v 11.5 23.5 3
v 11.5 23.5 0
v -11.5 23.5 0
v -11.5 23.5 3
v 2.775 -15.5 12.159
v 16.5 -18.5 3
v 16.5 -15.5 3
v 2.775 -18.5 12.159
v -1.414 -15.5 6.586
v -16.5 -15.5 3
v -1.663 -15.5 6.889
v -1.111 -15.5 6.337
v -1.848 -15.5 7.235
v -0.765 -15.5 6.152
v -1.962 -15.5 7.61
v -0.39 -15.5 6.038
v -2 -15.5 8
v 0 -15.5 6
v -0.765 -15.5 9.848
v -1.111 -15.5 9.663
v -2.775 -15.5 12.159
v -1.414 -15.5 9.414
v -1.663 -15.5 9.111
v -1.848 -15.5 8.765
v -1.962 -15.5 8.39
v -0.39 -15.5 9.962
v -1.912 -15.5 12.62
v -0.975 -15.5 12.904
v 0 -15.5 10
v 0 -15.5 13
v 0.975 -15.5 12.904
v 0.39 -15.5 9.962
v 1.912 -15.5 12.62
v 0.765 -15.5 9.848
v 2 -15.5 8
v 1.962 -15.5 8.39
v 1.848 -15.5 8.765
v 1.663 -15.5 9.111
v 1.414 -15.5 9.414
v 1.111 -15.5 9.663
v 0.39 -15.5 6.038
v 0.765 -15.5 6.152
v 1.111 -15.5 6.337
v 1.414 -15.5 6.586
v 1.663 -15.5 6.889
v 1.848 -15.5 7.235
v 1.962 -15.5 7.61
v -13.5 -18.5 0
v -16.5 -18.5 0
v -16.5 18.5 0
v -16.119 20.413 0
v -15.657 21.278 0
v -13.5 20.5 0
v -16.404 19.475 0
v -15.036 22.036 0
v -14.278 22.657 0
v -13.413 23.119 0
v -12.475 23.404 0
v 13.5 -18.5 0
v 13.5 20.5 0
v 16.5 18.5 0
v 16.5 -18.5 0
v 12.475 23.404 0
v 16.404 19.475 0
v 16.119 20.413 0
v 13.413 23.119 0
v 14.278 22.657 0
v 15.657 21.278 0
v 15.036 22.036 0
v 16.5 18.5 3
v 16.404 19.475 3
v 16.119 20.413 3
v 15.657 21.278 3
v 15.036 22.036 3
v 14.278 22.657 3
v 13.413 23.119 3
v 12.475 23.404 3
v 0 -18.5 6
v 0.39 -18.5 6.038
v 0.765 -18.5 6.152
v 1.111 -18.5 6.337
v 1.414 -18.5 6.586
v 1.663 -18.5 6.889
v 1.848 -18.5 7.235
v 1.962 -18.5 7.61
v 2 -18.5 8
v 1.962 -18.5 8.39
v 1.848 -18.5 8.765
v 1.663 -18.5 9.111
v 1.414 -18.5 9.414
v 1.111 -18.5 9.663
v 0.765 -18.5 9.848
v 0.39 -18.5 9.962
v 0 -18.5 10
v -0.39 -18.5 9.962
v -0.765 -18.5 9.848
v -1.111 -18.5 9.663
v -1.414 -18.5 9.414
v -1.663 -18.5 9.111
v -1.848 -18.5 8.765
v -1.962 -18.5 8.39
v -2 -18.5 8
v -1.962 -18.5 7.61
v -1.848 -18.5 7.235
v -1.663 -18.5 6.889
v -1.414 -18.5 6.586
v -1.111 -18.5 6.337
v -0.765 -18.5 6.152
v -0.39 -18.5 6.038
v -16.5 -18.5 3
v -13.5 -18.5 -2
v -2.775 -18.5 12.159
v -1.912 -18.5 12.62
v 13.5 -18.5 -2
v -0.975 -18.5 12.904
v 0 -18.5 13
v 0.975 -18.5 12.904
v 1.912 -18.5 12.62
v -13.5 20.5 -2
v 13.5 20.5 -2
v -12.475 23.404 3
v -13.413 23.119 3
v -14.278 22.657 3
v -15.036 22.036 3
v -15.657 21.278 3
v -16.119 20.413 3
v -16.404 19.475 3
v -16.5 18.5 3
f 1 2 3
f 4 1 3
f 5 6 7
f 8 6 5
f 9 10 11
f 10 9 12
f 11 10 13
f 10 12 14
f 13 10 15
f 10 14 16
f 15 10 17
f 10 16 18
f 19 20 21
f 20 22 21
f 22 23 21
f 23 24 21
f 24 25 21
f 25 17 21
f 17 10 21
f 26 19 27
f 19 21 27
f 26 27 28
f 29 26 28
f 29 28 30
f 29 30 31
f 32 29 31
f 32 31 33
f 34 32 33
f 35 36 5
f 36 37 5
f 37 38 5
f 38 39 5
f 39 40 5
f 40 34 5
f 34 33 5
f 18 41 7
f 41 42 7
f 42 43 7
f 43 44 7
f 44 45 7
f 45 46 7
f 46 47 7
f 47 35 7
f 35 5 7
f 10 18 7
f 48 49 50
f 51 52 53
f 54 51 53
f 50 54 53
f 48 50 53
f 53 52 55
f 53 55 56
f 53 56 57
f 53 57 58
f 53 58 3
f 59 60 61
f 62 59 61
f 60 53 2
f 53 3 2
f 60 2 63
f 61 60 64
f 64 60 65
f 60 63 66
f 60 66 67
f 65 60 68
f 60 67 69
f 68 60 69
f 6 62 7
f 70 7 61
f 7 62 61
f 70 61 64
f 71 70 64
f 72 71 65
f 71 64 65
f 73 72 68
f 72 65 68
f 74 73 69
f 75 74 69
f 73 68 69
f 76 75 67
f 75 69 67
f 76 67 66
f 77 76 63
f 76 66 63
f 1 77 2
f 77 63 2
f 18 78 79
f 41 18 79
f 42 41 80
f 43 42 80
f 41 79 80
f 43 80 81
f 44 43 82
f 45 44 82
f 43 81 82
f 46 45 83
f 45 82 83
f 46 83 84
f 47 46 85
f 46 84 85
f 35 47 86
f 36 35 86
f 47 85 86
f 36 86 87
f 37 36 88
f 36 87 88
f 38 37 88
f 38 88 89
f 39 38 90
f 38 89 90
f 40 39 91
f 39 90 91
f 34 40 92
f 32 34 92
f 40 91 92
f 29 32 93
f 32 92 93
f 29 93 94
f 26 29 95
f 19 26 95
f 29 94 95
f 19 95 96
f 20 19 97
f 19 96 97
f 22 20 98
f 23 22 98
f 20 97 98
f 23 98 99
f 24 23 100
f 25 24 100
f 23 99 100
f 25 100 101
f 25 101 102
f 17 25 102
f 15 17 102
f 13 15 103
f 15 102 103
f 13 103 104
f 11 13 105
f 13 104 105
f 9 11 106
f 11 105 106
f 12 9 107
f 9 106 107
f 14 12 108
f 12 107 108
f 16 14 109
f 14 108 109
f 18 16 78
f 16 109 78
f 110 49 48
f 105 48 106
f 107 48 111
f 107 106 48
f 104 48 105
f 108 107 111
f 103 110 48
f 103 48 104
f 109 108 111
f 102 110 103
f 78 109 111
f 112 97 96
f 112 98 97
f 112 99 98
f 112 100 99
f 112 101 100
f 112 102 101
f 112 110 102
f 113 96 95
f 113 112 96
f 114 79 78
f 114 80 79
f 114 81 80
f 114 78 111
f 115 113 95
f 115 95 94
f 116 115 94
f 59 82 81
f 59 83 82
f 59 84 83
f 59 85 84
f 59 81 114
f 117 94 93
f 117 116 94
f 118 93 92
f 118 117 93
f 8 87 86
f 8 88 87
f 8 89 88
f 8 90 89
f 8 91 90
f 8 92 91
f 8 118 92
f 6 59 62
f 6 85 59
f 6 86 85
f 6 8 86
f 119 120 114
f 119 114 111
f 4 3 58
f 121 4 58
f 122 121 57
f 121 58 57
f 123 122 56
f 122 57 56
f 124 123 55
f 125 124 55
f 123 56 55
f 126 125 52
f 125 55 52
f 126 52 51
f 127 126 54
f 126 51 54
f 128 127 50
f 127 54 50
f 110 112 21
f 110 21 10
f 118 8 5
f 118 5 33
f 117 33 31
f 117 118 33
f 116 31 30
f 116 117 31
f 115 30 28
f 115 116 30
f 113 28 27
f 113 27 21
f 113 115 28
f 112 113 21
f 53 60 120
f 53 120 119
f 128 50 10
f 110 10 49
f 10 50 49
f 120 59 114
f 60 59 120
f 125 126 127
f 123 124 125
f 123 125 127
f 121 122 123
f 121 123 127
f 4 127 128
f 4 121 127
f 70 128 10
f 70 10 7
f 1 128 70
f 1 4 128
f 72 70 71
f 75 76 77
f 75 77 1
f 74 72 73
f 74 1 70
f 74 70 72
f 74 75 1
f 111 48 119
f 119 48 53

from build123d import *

# Parameters (mm, degrees)
EXTRUDE_1_DEPTH = 3
SKETCH_2_R      = 2
EXTRUDE_2_DEPTH = 3
SKETCH_3_W      = 27
SKETCH_3_H      = 39
EXTRUDE_3_DEPTH = 2


with BuildPart() as part:
    # 草图1 → 凸台-拉伸1 (new body)
    with BuildSketch(Plane.XY):
        with BuildLine():
            Line((11.5, 23.5), (-11.5, 23.5))
            ThreePointArc((-11.5, 23.5), (-15.035533906, 22.035533906), (-16.5, 18.5))
            Line((-16.5, 18.5), (-16.5, -18.5))
            Line((-16.5, -18.5), (16.5, -18.5))
            Line((16.5, -18.5), (16.5, 18.5))
            ThreePointArc((16.5, 18.5), (15.035533906, 22.035533906), (11.5, 23.5))
        make_face()
    extrude(amount=EXTRUDE_1_DEPTH)

    # 草图2 → 凸台-拉伸2 (add)
    with BuildSketch(Plane.XZ.offset(18.5)):
        with BuildLine():
            ThreePointArc((-1.2e-08, 3), (-4.785122024, 6.549963029), (-2.775441548, 12.158957107))
            Line((-2.775441548, 12.158957107), (-16.5, 3))
            Line((-16.5, 3), (-1.2e-08, 3))
        make_face()
        with BuildLine():
            Line((16.5, 3), (2.775441548, 12.158957107))
            ThreePointArc((2.775441548, 12.158957107), (4.40892321, 10.358261252), (5, 8))
            ThreePointArc((5, 8), (3.535533902, 4.46446609), (-1.2e-08, 3))
            Line((-1.2e-08, 3), (16.5, 3))
        make_face()
        with BuildLine():
            ThreePointArc((2.775441548, 12.158957107), (0, 13), (-2.775441548, 12.158957107))
            ThreePointArc((-2.775441548, 12.158957107), (-4.785122024, 6.549963029), (-1.2e-08, 3))
            ThreePointArc((-1.2e-08, 3), (3.535533902, 4.46446609), (5, 8))
            ThreePointArc((5, 8), (4.40892321, 10.358261252), (2.775441548, 12.158957107))
        make_face()
        with Locations(Location((0, 8, 0), (0, 0, 270))):
            Circle(SKETCH_2_R, mode=Mode.SUBTRACT)
    extrude(amount=-EXTRUDE_2_DEPTH)

    # 草图3 → 凸台-拉伸3 (add)
    with BuildSketch(Plane(origin=(0, 0, 0), x_dir=(-1, 0, 0), z_dir=(0, 0, -1))):
        with Locations((0, 1)):
            Rectangle(SKETCH_3_W, SKETCH_3_H)
    extrude(amount=EXTRUDE_3_DEPTH)


solid = part.part
